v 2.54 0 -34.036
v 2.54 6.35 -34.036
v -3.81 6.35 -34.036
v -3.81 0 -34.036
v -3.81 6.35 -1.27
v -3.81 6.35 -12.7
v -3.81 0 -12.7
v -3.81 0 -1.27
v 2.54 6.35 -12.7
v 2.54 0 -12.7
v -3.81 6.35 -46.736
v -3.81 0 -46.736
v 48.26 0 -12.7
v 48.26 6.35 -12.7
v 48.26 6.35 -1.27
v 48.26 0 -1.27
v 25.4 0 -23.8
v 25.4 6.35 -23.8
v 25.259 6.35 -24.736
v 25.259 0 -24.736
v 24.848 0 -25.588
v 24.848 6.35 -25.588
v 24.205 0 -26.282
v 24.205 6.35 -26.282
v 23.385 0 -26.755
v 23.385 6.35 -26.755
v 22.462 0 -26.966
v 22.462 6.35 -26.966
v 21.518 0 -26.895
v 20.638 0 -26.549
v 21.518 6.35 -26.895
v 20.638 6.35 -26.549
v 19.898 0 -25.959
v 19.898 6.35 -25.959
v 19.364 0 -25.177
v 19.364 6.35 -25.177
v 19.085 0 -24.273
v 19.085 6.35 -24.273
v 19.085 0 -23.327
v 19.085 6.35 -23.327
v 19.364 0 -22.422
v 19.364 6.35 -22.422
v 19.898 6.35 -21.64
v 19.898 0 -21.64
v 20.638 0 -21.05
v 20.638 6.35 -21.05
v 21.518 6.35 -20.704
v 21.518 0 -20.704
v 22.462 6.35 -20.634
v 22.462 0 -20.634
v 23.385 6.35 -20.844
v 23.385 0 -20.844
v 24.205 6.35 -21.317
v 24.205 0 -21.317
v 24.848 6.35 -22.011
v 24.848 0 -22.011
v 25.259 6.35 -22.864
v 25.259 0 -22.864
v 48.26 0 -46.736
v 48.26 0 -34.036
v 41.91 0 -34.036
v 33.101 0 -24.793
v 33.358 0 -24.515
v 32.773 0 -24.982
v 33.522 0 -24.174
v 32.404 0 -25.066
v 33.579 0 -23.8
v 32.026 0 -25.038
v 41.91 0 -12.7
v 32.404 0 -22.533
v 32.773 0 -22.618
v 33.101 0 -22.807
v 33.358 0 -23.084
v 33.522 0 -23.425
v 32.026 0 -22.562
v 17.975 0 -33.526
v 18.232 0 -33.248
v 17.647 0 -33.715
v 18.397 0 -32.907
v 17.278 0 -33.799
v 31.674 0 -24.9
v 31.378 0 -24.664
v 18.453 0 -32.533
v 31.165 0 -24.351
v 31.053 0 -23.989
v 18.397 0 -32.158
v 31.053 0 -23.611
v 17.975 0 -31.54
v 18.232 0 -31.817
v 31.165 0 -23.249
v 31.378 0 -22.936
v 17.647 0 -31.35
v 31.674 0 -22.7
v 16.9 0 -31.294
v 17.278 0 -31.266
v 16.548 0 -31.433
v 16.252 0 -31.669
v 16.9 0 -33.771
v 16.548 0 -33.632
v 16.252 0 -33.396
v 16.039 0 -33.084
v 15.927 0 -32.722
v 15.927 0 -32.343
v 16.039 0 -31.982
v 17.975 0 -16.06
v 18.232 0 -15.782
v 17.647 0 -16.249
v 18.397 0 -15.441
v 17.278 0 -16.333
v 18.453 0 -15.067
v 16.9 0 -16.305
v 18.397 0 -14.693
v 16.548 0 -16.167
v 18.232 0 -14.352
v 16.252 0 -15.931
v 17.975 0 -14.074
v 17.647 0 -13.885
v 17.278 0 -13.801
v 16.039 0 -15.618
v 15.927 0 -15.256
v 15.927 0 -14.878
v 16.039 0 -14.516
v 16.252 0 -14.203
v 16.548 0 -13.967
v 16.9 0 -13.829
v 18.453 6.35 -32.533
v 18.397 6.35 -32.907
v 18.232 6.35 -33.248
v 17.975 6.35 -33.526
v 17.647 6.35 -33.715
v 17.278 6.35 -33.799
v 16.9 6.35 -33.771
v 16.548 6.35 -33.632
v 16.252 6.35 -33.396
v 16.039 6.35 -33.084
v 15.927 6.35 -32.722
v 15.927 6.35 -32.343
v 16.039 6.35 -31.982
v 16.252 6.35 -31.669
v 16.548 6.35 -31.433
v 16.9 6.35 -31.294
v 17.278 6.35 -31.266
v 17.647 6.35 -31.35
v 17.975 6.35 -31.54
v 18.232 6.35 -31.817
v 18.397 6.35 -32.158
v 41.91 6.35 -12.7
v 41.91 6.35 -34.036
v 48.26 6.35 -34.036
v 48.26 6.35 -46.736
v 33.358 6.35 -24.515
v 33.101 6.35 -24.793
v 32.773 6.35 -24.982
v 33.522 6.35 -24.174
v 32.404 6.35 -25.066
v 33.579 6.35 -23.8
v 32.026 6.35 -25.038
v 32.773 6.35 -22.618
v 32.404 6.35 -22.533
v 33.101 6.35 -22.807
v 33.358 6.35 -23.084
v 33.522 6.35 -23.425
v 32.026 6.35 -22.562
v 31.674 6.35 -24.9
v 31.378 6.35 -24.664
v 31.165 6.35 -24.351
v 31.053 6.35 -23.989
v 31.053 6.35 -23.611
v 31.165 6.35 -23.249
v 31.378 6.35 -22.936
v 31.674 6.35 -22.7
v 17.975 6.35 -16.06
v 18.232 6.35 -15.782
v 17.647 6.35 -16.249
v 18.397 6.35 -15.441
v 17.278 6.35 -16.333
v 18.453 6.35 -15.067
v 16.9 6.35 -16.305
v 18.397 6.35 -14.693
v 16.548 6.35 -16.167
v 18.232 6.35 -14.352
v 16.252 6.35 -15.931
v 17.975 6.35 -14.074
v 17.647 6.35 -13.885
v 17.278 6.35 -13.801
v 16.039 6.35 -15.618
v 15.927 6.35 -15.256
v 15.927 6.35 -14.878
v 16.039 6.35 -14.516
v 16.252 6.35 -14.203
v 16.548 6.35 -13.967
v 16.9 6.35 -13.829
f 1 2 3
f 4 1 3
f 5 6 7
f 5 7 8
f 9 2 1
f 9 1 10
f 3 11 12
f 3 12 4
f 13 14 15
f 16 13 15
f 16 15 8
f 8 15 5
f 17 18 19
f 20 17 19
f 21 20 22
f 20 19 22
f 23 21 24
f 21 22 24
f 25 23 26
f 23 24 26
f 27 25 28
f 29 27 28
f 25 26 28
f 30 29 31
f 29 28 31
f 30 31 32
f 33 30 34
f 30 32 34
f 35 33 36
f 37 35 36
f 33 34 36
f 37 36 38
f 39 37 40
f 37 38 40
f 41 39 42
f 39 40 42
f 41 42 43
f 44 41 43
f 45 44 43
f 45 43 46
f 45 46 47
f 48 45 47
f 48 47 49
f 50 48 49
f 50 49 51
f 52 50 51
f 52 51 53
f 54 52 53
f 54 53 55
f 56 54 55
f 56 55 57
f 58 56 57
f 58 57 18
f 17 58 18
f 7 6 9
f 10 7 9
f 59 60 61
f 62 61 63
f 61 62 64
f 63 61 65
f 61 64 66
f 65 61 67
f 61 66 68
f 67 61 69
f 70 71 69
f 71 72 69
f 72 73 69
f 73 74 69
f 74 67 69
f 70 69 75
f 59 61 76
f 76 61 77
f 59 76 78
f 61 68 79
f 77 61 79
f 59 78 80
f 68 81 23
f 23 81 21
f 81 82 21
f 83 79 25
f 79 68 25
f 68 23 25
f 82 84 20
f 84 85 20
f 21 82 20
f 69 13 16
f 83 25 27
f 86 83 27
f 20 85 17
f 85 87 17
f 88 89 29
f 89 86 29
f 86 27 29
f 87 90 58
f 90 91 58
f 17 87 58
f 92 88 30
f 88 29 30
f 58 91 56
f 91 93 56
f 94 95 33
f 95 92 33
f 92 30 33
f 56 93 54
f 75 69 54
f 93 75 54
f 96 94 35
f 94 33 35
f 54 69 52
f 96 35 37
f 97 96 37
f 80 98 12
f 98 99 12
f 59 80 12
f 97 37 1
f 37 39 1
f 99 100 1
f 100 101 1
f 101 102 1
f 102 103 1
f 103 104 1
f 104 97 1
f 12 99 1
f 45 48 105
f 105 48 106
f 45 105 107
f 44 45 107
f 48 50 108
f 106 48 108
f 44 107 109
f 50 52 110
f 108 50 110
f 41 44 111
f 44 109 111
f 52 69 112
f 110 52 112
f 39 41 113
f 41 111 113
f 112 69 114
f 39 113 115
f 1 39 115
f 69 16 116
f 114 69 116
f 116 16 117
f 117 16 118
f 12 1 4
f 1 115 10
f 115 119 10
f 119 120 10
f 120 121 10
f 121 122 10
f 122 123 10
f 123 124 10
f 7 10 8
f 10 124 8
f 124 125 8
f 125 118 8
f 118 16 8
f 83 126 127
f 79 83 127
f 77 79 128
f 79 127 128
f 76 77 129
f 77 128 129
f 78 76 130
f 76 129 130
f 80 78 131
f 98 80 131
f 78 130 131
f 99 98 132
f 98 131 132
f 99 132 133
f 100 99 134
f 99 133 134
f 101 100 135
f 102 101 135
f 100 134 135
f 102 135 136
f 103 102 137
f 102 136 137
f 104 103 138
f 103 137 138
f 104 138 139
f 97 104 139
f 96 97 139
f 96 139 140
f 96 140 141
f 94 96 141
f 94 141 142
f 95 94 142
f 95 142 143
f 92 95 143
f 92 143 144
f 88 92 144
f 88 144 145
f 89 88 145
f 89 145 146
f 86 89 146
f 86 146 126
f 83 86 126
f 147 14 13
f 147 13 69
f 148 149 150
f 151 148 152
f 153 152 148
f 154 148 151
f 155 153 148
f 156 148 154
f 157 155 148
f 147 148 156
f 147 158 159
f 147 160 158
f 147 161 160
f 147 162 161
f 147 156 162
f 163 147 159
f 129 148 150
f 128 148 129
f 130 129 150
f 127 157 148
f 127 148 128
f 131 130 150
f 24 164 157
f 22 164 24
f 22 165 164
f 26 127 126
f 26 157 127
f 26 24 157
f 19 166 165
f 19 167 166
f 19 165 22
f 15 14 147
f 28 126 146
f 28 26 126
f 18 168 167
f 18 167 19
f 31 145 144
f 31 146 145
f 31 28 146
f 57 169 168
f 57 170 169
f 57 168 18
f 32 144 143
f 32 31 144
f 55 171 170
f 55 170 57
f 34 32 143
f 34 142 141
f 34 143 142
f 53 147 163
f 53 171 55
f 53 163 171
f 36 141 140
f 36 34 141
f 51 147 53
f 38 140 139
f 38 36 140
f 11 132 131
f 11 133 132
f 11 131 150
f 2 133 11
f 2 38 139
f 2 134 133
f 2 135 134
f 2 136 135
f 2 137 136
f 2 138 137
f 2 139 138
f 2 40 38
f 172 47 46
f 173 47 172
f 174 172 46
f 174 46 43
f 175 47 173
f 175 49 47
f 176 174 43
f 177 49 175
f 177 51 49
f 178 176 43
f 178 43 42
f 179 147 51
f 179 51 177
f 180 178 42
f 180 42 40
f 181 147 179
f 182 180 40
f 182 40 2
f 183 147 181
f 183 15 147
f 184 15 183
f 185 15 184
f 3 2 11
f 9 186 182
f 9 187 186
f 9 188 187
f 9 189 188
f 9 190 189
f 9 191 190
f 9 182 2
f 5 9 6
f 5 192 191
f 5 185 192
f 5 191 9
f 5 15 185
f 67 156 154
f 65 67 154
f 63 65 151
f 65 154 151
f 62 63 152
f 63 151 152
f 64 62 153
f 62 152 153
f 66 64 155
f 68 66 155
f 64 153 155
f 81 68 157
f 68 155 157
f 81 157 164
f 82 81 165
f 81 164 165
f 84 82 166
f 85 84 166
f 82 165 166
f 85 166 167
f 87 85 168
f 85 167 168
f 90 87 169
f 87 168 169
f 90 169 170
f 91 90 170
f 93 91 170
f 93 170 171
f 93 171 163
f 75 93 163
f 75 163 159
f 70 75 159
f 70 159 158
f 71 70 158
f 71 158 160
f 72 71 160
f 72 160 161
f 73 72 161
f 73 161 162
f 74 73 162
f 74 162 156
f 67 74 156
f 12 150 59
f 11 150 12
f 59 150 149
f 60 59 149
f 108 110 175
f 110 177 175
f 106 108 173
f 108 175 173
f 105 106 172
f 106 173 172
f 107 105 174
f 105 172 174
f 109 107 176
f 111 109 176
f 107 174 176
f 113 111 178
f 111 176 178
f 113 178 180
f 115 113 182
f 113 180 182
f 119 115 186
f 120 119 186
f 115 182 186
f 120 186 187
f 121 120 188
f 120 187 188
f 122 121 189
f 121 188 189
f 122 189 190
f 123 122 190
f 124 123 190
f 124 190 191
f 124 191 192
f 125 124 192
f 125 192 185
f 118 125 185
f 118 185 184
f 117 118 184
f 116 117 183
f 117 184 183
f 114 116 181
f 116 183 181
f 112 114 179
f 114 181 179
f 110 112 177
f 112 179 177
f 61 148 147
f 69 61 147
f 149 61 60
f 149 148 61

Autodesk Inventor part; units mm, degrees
ref_plane "YZ Plane" through (0, 0, 0) normal (1, 0, 0) x (0, 1, 0)
ref_plane "XZ Plane" through (0, 0, 0) normal (0, 1, 0) x (-1, 0, 0)
ref_plane "XY Plane" through (0, 0, 0) normal (0, 0, 1) x (1, 0, 0)
sketch "Sketch1" plane through (0, 0, 0) normal (0, 1, 0) x (-1, 0, 0)
  line L0 (0, 0) -> (-44.45, 0)
  line L1 (-44.45, 0) -> (-44.45, -47.5996)
  line L2 (-44.45, -47.5996) -> (0, -47.5996)
  line L3 (0, -47.5996) -> (0, 0)
  dimension "d0" = 44.45
  dimension "d1" = 47.5996
extrude "Extrusion1" add sketch "Sketch1" along normal blind 6.35
sketch "Sketch2" plane through (0, 6.35, 0) normal (0, 1, 0) x (1, 0, 0)
  line L0 (0, 47.5996) -> (0, 0) projected
  line L1 (0, 12.7) -> (6.35, 12.7)
  line L2 (6.35, 12.7) -> (6.35, 34.036)
  line L3 (6.35, 34.036) -> (0, 34.036)
  line L4 (0, 34.036) -> (0, 12.7)
  line L5 (44.45, 0) -> (44.45, 47.5996) projected
  line L6 (44.45, 12.7) -> (38.1, 12.7)
  line L7 (38.1, 12.7) -> (38.1, 34.036)
  line L8 (38.1, 34.036) -> (44.45, 34.036)
  line L9 (44.45, 34.036) -> (44.45, 12.7)
  dimension "d4" = 6.35
  dimension "d5" = 21.336
  dimension "d6" = 6.35
extrude "Extrusion2" cut sketch "Sketch2" against normal blind 6.35
sketch "Sketch3" plane through (0, 6.35, 0) normal (0, 1, 0) x (1, 0, 0)
  circle A0 centre (22.225, 23.7998) radius 3.175
  circle A1 centre (32.3088, 23.7998) radius 1.27
  circle A2 centre (17.1831, 32.5326) radius 1.27
  circle A3 centre (17.1831, 15.067) radius 1.27
  point P0 (0, 0)
  dimension "d9" = 6.35
  dimension "d10" = 2.54
  dimension "d13" = 360
extrude "Extrusion3" cut sketch "Sketch3" against normal blind 6.35
sketch "Sketch4" plane through (0, 6.35, 0) normal (0, 1, 0) x (1, 0, 0)
  line L0 (44.45, 47.5996) -> (48.26, 47.5996)
  line L1 (48.26, 47.5996) -> (48.26, 0)
  line L2 (48.26, 0) -> (44.45, 0)
  line L3 (44.45, 0) -> (44.45, 47.5996)
  line L4 (0, 47.5996) -> (-3.81, 47.5996)
  line L5 (-3.81, 47.5996) -> (-3.81, 0)
  line L6 (-3.81, 0) -> (0, 0)
  line L7 (0, 0) -> (0, 47.5996)
  line L8 (0, 12.7) -> (6.35, 12.7) projected
  line L9 (6.35, 34.036) -> (2.54, 34.036)
  line L10 (2.54, 34.036) -> (2.54, 12.7)
  line L11 (2.54, 12.7) -> (6.35, 12.7)
  line L12 (6.35, 12.7) -> (6.35, 34.036)
  line L13 (44.45, 12.7) -> (38.1, 12.7) projected
  line L14 (38.1, 34.036) -> (41.91, 34.036)
  line L15 (41.91, 34.036) -> (41.91, 12.7)
  line L16 (41.91, 12.7) -> (38.1, 12.7)
  line L17 (38.1, 12.7) -> (38.1, 34.036)
  point P0 (0, 0)
  dimension "d17" = 3.81
  dimension "d18" = 3.81
  dimension "d19" = 3.81
  dimension "d20" = 3.81
extrude "Extrusion4" add sketch "Sketch4" against normal blind 6.35
sketch "Sketch5" plane through (0, 6.35, 0) normal (0, 1, 0) x (1, 0, 0)
  line L0 (-3.81, 0) -> (-3.81, 47.5996) projected
  line L1 (0, 34.036) -> (-3.81, 34.036)
  line L2 (-3.81, 34.036) -> (-3.81, 12.7)
  line L3 (-3.81, 12.7) -> (0, 12.7)
  line L4 (0, 12.7) -> (0, 34.036)
  line L5 (48.26, 47.5996) -> (48.26, 0) projected
  line L6 (44.45, 34.036) -> (48.26, 34.036)
  line L7 (48.26, 34.036) -> (48.26, 12.7)
  line L8 (48.26, 12.7) -> (44.45, 12.7)
  line L9 (44.45, 12.7) -> (44.45, 34.036)
  point P0 (0, 0)
extrude "Extrusion5" cut sketch "Sketch5" against normal blind 6.35
sketch "Sketch6" plane through (0, 6.35, 0) normal (0, 1, 0) x (1, 0, 0)
  line L0 (48.26, 12.7) -> (48.26, 0) projected
  line L1 (-3.81, 0) -> (48.26, 0)
  line L2 (48.26, 0) -> (48.26, 1.27)
  line L3 (48.26, 1.27) -> (-3.81, 1.27)
  line L4 (-3.81, 1.27) -> (-3.81, 0)
  line L5 (48.26, 47.5996) -> (48.26, 34.036) projected
  line L6 (-3.81, 47.5996) -> (48.26, 47.5996)
  line L7 (48.26, 47.5996) -> (48.26, 46.736)
  line L8 (48.26, 46.736) -> (-3.81, 46.736)
  line L9 (-3.81, 46.736) -> (-3.81, 47.5996)
  point P0 (0, 0)
  dimension "d25" = 1.27
  dimension "d26" = 0.8636
extrude "Extrusion6" cut sketch "Sketch6" against normal blind 25.4
properties part number "motor holder"
